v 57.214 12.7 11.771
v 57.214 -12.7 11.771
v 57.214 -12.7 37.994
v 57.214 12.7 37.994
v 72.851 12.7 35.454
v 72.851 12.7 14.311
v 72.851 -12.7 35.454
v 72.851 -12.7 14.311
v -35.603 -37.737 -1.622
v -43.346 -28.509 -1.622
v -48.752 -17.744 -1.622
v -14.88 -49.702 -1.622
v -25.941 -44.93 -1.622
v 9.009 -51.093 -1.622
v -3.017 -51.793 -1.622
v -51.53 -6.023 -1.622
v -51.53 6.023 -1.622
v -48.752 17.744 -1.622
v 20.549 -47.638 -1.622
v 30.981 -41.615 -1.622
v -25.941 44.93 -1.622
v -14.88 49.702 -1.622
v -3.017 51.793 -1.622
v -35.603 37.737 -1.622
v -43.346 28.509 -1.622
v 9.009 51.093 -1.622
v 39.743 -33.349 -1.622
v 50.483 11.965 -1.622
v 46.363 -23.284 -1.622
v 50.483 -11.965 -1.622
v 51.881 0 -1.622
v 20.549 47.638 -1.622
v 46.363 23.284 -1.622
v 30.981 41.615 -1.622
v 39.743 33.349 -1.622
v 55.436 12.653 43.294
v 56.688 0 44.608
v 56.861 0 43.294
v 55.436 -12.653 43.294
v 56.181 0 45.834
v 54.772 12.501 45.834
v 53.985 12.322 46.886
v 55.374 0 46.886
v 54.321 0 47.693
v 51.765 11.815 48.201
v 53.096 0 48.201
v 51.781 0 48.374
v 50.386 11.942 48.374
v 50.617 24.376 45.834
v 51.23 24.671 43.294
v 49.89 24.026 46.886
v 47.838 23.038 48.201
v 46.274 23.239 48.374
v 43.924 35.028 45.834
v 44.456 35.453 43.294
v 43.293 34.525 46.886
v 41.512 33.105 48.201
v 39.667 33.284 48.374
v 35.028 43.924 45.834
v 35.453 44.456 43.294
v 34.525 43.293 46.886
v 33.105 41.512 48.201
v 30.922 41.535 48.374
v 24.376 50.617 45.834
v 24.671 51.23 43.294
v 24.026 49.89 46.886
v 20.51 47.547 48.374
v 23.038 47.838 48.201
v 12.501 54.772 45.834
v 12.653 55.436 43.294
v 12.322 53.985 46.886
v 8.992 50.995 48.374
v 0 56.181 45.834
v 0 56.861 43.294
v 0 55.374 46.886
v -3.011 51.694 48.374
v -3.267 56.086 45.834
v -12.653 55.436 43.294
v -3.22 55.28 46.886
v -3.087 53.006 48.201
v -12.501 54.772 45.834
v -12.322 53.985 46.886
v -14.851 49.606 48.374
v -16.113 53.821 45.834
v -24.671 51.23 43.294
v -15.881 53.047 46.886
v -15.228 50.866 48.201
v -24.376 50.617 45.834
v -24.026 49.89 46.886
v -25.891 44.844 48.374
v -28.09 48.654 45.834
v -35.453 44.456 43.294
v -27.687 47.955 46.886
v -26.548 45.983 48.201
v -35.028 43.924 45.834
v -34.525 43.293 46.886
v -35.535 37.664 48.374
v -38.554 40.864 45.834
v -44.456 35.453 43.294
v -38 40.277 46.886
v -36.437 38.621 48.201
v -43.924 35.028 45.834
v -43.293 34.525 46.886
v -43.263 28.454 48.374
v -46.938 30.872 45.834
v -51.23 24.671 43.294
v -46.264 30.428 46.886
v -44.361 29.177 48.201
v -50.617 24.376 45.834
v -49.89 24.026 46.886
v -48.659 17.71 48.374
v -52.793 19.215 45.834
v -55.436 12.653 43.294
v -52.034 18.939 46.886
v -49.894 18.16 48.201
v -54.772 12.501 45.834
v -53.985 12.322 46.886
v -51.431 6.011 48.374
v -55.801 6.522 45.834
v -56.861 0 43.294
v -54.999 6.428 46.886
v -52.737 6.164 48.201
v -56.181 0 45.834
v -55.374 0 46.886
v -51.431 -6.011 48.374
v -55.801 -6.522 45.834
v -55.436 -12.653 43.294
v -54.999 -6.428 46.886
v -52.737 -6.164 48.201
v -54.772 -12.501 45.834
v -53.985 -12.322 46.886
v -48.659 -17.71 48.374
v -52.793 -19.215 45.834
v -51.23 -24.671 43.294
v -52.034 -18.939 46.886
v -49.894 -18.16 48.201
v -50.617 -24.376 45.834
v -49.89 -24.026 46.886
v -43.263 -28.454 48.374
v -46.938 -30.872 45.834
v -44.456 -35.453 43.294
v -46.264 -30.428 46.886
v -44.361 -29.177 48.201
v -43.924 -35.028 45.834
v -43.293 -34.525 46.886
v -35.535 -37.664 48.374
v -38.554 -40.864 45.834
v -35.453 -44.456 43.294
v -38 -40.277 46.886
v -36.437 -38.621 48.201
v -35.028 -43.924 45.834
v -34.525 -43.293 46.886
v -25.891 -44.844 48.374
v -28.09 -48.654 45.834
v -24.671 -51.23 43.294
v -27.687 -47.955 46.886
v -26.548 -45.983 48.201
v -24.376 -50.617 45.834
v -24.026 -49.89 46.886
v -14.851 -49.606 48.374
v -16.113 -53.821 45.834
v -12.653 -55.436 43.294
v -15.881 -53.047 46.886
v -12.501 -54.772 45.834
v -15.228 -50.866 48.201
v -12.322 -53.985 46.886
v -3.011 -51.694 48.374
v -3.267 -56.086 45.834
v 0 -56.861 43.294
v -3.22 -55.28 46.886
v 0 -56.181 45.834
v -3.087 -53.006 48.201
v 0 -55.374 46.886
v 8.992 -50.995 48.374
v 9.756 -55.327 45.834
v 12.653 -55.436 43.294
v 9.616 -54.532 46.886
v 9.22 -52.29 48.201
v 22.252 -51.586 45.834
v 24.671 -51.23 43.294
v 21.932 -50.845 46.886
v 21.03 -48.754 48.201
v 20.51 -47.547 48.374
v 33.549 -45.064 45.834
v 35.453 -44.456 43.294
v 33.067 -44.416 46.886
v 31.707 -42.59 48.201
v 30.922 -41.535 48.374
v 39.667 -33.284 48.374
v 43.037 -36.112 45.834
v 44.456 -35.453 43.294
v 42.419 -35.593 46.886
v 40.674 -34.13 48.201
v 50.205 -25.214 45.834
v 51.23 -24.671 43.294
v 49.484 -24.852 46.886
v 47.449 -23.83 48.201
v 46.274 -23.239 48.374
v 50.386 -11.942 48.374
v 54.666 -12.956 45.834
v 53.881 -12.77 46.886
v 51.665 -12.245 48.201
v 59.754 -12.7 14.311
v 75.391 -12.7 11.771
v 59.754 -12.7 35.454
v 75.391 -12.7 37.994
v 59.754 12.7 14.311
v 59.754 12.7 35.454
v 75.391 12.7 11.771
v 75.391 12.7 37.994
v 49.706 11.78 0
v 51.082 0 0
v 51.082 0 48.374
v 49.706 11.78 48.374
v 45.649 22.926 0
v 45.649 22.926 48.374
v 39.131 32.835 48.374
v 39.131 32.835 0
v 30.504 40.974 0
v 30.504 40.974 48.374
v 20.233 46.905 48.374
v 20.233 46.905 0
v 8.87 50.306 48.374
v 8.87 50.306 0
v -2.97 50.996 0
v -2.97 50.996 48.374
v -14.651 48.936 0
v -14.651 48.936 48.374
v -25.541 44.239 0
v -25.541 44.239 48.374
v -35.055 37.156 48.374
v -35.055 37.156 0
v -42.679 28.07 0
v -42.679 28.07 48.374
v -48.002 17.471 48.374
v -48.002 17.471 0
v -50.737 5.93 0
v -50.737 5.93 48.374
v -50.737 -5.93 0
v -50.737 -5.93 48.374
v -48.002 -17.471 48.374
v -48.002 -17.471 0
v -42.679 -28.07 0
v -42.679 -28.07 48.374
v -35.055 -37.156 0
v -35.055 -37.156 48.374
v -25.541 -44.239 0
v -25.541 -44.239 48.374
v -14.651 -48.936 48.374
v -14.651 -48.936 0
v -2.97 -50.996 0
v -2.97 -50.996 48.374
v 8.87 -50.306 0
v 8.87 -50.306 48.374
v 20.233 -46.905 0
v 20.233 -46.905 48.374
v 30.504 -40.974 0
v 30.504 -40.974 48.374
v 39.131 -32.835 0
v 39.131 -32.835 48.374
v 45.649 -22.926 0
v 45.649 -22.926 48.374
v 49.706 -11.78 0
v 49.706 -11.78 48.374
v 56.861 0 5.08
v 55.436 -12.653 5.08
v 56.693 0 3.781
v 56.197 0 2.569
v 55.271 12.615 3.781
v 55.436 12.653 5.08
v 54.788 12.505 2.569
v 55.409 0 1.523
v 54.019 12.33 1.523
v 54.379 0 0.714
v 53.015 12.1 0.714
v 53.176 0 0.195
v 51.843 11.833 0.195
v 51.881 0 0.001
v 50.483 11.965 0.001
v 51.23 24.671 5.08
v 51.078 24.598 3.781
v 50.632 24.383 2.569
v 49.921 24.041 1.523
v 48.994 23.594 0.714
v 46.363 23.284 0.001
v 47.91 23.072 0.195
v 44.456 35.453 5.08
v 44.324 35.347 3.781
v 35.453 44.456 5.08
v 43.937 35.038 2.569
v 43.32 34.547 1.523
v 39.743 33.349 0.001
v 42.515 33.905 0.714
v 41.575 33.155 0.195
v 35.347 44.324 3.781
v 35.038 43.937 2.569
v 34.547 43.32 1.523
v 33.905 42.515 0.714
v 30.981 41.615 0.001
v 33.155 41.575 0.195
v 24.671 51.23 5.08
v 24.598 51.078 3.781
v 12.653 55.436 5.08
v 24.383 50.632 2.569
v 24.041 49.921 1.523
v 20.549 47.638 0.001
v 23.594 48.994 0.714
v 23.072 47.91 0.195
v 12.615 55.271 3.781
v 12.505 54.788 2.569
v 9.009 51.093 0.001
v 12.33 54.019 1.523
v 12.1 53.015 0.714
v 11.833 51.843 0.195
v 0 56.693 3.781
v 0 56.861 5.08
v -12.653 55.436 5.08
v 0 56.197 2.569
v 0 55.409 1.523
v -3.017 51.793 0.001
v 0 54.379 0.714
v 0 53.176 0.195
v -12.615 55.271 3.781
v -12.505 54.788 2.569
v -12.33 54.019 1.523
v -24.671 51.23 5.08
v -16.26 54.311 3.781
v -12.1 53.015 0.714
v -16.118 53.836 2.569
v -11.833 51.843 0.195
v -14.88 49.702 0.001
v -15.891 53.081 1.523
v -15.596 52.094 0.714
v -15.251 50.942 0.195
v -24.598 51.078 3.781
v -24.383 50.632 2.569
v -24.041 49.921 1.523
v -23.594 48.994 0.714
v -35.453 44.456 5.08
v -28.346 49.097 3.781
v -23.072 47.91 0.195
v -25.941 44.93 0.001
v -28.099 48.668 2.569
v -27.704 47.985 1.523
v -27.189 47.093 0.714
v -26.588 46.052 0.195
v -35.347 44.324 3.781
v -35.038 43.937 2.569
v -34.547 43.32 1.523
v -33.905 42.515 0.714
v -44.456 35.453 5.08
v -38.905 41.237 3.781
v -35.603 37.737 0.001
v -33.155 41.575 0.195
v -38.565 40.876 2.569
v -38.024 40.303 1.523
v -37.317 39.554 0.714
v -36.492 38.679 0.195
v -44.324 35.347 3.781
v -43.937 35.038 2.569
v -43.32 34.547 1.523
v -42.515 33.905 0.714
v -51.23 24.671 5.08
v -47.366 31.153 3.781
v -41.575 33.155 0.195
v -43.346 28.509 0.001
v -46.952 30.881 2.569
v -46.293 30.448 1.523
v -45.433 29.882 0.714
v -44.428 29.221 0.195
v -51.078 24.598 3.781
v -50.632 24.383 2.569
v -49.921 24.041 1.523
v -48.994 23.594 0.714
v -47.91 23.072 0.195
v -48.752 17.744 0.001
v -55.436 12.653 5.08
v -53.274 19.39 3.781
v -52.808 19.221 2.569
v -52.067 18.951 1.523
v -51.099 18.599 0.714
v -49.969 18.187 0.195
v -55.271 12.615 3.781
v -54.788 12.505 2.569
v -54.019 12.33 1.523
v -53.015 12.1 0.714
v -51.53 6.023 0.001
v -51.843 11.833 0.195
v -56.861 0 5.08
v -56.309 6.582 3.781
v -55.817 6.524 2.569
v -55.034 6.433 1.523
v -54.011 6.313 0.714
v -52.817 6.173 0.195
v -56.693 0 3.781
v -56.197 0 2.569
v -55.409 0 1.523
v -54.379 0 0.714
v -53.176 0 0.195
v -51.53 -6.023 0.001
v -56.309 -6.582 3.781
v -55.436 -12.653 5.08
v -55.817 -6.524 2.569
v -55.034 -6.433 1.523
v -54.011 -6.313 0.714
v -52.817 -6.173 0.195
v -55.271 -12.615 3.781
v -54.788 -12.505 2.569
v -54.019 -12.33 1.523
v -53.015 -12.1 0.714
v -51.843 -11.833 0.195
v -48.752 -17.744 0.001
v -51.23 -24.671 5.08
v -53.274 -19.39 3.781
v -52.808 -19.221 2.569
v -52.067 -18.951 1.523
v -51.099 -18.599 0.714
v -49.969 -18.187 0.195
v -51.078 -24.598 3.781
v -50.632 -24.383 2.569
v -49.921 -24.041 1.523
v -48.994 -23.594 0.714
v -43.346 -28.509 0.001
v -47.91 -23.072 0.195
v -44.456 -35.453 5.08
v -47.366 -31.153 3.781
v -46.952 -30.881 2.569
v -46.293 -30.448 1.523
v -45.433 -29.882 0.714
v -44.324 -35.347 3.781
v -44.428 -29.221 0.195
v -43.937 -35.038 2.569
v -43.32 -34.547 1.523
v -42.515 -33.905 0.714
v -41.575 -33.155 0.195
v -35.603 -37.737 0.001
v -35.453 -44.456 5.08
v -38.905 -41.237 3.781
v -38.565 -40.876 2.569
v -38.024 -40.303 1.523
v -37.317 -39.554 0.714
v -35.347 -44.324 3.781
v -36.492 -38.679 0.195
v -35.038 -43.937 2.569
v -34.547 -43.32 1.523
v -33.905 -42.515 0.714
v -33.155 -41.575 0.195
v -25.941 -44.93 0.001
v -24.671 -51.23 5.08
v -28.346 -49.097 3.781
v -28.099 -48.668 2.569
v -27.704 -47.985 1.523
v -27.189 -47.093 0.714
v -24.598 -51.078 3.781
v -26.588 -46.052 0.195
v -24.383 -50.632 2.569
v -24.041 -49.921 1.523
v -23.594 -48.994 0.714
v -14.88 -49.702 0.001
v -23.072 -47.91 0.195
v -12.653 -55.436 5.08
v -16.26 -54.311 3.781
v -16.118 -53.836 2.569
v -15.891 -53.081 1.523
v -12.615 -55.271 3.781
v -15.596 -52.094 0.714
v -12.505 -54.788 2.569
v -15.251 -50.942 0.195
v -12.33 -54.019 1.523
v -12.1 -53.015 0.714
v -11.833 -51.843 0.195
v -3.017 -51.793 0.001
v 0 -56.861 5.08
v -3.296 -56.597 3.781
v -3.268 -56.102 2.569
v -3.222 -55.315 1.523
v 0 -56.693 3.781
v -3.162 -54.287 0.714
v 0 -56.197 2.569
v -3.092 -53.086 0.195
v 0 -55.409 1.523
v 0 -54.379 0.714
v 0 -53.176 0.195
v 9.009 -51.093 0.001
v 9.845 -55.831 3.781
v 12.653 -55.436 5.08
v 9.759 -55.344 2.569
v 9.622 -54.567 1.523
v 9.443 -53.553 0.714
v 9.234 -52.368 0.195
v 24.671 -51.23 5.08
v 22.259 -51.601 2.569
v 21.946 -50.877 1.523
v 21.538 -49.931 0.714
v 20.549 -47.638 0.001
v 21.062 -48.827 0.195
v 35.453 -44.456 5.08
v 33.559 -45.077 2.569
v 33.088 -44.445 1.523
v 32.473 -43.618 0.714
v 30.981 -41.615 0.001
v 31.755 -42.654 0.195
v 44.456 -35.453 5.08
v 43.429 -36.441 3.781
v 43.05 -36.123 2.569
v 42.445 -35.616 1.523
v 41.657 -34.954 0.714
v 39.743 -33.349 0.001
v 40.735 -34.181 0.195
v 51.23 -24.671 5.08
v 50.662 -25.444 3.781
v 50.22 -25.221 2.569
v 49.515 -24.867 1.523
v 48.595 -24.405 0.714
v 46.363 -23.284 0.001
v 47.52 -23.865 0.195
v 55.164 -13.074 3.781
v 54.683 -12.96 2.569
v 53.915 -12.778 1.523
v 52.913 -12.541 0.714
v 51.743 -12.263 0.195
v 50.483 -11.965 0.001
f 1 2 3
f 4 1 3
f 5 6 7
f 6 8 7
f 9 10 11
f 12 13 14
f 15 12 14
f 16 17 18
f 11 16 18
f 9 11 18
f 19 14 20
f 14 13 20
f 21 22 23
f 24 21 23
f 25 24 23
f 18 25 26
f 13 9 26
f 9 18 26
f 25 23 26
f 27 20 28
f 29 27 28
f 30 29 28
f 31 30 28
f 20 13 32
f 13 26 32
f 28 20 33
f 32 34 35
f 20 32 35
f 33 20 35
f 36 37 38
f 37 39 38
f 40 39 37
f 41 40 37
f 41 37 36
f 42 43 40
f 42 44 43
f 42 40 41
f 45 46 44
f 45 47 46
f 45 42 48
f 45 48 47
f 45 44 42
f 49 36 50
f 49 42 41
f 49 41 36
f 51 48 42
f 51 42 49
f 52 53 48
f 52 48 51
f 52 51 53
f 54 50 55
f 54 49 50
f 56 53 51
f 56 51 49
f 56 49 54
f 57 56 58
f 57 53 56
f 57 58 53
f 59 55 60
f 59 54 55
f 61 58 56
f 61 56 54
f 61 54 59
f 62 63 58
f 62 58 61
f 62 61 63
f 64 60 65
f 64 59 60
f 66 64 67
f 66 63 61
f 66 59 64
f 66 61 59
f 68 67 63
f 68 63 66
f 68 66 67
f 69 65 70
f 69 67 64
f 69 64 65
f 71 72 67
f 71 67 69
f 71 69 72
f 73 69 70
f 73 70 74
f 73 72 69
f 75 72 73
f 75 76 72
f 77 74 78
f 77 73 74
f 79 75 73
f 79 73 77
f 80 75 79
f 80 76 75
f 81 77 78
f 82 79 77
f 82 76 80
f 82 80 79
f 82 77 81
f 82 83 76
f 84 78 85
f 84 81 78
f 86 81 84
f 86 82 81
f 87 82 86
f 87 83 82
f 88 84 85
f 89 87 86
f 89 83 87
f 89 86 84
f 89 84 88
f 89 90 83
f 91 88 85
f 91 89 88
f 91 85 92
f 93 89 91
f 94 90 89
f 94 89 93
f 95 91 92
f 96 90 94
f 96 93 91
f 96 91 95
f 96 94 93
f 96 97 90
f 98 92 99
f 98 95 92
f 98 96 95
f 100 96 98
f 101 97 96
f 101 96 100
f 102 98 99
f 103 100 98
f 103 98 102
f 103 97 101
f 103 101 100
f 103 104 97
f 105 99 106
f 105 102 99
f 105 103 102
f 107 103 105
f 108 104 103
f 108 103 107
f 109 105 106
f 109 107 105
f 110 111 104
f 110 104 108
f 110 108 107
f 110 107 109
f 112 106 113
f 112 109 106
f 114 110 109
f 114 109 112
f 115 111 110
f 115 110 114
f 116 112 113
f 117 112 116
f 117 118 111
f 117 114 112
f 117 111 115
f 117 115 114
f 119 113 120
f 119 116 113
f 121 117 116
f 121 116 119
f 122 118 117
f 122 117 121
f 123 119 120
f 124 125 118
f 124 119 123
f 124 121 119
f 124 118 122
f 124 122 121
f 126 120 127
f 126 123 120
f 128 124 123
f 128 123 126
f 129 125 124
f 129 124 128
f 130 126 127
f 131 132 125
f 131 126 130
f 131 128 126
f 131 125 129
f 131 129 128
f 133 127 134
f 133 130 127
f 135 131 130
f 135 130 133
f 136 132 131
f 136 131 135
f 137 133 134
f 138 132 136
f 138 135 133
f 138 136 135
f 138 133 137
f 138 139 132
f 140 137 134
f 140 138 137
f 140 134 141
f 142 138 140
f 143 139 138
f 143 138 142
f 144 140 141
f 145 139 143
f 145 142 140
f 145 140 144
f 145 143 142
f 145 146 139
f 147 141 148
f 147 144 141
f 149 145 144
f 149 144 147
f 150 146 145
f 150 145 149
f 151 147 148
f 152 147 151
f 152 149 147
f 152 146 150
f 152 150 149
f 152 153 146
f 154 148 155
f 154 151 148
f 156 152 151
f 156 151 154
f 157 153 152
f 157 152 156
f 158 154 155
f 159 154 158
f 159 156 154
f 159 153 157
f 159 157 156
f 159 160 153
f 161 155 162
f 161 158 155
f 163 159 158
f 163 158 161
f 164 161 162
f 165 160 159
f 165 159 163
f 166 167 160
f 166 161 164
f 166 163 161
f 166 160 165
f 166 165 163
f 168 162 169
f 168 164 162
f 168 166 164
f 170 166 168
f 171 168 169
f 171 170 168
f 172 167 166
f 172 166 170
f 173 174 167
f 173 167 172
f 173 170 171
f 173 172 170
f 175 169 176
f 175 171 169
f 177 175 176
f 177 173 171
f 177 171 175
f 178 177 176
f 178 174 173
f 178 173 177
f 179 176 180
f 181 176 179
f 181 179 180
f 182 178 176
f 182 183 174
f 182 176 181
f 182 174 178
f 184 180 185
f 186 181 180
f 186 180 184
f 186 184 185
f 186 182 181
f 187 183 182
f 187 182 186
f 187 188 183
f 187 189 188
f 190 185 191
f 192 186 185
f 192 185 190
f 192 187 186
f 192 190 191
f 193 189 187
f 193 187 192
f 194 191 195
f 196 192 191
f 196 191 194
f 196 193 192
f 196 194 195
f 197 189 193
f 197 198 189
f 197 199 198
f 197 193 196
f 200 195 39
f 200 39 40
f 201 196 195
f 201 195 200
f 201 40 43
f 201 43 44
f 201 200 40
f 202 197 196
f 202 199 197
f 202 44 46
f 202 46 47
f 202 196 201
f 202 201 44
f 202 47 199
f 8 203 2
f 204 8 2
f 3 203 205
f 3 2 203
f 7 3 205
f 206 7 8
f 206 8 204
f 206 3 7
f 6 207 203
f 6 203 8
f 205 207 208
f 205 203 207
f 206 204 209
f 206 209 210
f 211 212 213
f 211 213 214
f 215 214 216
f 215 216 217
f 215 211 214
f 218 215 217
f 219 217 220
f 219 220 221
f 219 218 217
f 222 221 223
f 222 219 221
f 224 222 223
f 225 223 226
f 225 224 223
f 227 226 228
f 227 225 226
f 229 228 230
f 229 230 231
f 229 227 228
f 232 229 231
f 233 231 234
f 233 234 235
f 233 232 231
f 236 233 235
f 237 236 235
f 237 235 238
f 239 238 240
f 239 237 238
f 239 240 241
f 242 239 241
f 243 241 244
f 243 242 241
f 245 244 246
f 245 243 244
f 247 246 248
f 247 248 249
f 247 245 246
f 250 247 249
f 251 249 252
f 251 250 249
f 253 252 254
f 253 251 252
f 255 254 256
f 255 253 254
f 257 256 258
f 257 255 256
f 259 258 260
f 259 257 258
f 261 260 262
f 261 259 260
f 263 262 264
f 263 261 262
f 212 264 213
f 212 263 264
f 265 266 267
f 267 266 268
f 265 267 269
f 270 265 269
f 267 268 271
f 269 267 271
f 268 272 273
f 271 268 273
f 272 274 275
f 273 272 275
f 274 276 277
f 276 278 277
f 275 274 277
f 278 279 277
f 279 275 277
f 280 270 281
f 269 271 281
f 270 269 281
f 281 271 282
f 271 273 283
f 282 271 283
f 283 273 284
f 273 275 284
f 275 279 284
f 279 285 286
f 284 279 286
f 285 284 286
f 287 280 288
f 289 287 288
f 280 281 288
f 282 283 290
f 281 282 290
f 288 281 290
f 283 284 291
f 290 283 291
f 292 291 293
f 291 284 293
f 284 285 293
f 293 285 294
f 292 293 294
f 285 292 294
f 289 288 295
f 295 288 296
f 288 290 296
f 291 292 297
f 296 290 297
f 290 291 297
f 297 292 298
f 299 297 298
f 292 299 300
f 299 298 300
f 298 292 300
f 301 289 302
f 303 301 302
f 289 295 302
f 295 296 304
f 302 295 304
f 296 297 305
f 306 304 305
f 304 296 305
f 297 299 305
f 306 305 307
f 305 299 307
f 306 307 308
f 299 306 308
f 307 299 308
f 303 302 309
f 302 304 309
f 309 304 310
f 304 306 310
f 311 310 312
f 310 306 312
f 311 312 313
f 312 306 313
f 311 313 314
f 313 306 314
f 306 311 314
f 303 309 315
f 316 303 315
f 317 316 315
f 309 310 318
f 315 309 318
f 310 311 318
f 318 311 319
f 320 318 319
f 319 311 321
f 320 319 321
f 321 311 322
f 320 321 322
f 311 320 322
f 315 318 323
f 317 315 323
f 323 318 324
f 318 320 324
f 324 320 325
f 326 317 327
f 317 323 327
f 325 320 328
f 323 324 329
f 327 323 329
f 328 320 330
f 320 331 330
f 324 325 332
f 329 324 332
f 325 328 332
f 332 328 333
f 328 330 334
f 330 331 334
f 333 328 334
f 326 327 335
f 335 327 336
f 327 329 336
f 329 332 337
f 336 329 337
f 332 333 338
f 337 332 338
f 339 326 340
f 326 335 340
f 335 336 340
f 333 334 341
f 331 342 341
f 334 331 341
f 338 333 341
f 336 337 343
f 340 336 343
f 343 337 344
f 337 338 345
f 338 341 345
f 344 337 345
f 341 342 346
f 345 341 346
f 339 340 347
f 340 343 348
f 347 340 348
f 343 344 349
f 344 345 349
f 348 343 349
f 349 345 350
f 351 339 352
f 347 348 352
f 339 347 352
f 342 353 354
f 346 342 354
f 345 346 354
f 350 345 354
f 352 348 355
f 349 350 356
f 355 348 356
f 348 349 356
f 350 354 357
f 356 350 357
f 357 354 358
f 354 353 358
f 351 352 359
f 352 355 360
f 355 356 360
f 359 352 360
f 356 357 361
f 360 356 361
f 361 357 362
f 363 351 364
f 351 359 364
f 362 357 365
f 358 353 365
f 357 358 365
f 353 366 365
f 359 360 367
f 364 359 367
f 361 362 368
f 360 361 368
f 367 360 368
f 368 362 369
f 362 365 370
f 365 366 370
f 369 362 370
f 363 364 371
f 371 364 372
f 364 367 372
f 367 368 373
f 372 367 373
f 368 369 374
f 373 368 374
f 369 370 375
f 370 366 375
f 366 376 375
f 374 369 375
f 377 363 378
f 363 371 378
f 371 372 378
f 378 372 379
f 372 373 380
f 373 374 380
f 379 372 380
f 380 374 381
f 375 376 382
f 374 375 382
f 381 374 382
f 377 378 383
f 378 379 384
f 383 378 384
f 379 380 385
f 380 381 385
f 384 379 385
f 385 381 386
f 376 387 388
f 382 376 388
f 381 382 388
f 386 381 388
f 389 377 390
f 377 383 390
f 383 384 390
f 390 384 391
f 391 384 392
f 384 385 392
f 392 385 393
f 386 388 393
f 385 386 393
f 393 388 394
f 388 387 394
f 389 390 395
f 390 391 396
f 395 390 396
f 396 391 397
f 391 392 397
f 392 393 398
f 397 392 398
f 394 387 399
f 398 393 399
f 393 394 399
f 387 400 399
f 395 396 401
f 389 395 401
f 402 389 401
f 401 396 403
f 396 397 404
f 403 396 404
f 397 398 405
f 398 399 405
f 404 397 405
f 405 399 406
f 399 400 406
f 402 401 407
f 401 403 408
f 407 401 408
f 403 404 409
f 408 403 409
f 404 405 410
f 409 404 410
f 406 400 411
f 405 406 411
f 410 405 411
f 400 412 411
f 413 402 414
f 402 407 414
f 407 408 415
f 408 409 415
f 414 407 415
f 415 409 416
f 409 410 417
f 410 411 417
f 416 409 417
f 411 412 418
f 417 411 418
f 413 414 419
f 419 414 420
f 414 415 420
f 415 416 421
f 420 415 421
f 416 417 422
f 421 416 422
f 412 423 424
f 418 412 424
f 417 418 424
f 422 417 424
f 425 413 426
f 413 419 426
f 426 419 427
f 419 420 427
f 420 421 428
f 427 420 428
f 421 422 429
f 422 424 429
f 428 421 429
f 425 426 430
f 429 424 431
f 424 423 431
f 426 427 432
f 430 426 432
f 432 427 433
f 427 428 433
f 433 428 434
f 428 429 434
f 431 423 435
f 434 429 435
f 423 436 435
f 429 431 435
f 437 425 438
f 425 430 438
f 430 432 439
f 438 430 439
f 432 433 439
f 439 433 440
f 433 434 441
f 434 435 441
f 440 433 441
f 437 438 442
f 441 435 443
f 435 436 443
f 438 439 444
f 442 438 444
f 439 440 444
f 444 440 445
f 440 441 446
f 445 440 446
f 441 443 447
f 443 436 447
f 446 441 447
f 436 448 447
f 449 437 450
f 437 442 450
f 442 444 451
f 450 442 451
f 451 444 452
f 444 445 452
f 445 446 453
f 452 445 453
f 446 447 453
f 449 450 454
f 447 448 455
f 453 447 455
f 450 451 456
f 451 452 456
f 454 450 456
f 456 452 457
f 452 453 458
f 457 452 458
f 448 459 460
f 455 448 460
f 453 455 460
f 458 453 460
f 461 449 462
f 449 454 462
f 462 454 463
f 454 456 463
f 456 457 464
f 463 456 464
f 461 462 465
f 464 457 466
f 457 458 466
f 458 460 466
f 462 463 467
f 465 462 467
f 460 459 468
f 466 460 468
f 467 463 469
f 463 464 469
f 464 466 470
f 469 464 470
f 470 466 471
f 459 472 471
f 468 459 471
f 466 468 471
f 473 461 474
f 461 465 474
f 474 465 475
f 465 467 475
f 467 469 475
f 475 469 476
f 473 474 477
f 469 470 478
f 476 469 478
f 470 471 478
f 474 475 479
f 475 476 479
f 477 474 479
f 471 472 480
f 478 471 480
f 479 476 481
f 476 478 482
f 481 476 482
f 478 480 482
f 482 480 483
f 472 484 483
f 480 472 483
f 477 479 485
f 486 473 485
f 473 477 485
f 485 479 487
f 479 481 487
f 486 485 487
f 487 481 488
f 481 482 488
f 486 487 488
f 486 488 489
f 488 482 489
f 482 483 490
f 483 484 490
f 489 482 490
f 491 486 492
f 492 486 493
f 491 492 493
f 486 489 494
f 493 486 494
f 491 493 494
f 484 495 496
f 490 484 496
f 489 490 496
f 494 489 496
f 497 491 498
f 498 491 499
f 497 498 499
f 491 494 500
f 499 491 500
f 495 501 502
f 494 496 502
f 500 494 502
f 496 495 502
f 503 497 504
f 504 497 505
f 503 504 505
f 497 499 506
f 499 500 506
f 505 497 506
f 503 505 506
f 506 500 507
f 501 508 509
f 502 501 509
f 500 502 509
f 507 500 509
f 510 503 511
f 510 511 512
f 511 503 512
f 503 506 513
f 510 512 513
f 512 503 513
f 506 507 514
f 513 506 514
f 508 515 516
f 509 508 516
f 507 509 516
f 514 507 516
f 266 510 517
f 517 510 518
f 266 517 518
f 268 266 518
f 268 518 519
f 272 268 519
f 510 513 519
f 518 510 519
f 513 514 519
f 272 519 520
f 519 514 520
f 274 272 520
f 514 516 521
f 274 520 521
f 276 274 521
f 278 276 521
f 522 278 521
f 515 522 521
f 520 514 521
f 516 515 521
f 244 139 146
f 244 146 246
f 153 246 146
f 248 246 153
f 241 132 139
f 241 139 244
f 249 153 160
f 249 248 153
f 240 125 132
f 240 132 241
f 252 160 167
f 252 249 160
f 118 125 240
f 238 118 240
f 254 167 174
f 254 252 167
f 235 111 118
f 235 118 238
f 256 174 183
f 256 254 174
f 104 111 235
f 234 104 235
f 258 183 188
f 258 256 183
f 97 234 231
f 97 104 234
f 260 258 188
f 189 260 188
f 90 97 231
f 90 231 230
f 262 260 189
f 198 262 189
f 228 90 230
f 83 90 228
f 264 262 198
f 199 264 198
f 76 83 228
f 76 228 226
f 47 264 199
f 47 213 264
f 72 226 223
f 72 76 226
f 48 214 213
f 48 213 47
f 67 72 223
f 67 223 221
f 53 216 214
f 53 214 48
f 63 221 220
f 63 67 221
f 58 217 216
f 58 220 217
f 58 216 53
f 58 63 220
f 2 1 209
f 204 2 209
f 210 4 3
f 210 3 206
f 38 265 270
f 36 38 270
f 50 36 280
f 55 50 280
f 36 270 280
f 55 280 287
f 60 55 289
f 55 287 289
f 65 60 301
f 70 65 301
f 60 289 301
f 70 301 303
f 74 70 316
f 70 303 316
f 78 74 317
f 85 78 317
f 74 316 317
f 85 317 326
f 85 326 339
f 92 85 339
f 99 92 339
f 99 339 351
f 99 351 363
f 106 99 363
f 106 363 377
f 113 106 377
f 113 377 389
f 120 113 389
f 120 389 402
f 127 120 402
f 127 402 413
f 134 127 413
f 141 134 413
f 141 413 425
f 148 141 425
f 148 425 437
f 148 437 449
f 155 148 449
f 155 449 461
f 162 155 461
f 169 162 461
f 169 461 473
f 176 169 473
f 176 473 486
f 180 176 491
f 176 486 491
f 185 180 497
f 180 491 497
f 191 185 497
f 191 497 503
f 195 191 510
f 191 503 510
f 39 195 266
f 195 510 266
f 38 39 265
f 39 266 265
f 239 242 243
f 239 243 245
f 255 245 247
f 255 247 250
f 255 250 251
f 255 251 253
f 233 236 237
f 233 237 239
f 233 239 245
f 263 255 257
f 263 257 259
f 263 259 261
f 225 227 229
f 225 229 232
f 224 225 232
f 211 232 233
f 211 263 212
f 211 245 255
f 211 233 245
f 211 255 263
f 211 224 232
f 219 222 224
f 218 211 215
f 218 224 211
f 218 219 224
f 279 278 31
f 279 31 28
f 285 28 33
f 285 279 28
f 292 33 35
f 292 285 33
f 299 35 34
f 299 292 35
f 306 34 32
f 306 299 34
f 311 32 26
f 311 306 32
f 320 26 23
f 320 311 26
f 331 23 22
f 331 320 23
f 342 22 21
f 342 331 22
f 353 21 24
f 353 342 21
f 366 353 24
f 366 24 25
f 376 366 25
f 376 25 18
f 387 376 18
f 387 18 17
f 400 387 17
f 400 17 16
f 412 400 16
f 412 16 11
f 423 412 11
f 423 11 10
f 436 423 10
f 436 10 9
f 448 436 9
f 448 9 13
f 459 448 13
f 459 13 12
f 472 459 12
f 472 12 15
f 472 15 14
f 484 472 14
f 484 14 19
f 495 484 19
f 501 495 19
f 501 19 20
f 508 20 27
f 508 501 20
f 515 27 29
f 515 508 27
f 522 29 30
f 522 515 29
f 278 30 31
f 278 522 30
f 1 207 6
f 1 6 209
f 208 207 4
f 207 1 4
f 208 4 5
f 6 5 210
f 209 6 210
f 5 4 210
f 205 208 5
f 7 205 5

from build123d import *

# Parameters (mm, degrees)
F0_R        = 56.8614302175
F0_R_2      = 51.0824903335
F1_DEPTH    = 48.3736
F2_R        = 51.8810866732
F3_DEPTH    = 1.62169
F4_W        = 18.1773193181
F4_H        = 26.2230178341
F5_DEPTH    = 12.7
F6_T        = -2.54
F7_R        = 5.08
F8_S5_R     = 51.8810866732
F8_T6_DEPTH = 89


# Not quite as in the source:
# - a fillet or chamfer that OpenCascade refuses, or shapes differently, is made with other operations: its cross-section is extruded or revolved along the edge and cut away or added


with BuildPart() as f1:
    # F0 (on Top) → F1 (new body)
    with BuildSketch(Plane.XY):
        Circle(F0_R)
        Circle(F0_R_2, mode=Mode.SUBTRACT)
    extrude(amount=F1_DEPTH)

    # F2 (on Top) → F3 (join)
    with BuildSketch(Plane.XY):
        Circle(F2_R)
    extrude(amount=-F3_DEPTH)

    # F7
    f7_edges = [f1.edges().sort_by_distance(p)[0] for p in [
        (-56.86143, 0, 48.3736),
    ]]
    fillet(f7_edges, radius=F7_R)

    # F8: fillet of radius 5.08 on 1 edges, made by hand


with BuildPart() as f5:
    # F4 (on Front) → F5 (new body, symmetric)
    with BuildSketch(Plane.XZ):
        with Locations((66.3025137037, 24.8820674606)):
            Rectangle(F4_W, F4_H)
    extrude(amount=F5_DEPTH, both=True)

    # F6
    f6_openings = [f5.faces().sort_by_distance(p)[0] for p in [
        (66.302514, -12.7, 24.882067),
        (66.302514, 12.7, 24.882067),
    ]]
    offset(amount=F6_T, openings=f6_openings)


with BuildPart() as f8_tool2:
    # F8_s3 → F8_t4 (revolve)
    with BuildSketch(Plane.XZ):
        with BuildLine():
            ThreePointArc((56.8614302175, 5.08), (55.3735326659, 1.4878975516), (51.7814302175, 0))
            Line((51.7814302175, 0), (56.8614302175, 0))
            Line((56.8614302175, 0), (56.8614302175, 5.08))
        make_face()
    revolve(axis=Axis((0, 0, 0), (0, 0, 1)))

    # F8_s5 → F8_t6 (cut, symmetric)
    with BuildSketch(Plane.XY.offset(2.5)):
        Circle(F8_S5_R)
    extrude(amount=F8_T6_DEPTH, both=True, mode=Mode.SUBTRACT)


with BuildPart() as f1_1:
    add(f1.part)

    # F8_t1: cut F8_tool2
    add(f8_tool2.part, mode=Mode.SUBTRACT)


solid = Compound([f5.part, f1_1.part])
